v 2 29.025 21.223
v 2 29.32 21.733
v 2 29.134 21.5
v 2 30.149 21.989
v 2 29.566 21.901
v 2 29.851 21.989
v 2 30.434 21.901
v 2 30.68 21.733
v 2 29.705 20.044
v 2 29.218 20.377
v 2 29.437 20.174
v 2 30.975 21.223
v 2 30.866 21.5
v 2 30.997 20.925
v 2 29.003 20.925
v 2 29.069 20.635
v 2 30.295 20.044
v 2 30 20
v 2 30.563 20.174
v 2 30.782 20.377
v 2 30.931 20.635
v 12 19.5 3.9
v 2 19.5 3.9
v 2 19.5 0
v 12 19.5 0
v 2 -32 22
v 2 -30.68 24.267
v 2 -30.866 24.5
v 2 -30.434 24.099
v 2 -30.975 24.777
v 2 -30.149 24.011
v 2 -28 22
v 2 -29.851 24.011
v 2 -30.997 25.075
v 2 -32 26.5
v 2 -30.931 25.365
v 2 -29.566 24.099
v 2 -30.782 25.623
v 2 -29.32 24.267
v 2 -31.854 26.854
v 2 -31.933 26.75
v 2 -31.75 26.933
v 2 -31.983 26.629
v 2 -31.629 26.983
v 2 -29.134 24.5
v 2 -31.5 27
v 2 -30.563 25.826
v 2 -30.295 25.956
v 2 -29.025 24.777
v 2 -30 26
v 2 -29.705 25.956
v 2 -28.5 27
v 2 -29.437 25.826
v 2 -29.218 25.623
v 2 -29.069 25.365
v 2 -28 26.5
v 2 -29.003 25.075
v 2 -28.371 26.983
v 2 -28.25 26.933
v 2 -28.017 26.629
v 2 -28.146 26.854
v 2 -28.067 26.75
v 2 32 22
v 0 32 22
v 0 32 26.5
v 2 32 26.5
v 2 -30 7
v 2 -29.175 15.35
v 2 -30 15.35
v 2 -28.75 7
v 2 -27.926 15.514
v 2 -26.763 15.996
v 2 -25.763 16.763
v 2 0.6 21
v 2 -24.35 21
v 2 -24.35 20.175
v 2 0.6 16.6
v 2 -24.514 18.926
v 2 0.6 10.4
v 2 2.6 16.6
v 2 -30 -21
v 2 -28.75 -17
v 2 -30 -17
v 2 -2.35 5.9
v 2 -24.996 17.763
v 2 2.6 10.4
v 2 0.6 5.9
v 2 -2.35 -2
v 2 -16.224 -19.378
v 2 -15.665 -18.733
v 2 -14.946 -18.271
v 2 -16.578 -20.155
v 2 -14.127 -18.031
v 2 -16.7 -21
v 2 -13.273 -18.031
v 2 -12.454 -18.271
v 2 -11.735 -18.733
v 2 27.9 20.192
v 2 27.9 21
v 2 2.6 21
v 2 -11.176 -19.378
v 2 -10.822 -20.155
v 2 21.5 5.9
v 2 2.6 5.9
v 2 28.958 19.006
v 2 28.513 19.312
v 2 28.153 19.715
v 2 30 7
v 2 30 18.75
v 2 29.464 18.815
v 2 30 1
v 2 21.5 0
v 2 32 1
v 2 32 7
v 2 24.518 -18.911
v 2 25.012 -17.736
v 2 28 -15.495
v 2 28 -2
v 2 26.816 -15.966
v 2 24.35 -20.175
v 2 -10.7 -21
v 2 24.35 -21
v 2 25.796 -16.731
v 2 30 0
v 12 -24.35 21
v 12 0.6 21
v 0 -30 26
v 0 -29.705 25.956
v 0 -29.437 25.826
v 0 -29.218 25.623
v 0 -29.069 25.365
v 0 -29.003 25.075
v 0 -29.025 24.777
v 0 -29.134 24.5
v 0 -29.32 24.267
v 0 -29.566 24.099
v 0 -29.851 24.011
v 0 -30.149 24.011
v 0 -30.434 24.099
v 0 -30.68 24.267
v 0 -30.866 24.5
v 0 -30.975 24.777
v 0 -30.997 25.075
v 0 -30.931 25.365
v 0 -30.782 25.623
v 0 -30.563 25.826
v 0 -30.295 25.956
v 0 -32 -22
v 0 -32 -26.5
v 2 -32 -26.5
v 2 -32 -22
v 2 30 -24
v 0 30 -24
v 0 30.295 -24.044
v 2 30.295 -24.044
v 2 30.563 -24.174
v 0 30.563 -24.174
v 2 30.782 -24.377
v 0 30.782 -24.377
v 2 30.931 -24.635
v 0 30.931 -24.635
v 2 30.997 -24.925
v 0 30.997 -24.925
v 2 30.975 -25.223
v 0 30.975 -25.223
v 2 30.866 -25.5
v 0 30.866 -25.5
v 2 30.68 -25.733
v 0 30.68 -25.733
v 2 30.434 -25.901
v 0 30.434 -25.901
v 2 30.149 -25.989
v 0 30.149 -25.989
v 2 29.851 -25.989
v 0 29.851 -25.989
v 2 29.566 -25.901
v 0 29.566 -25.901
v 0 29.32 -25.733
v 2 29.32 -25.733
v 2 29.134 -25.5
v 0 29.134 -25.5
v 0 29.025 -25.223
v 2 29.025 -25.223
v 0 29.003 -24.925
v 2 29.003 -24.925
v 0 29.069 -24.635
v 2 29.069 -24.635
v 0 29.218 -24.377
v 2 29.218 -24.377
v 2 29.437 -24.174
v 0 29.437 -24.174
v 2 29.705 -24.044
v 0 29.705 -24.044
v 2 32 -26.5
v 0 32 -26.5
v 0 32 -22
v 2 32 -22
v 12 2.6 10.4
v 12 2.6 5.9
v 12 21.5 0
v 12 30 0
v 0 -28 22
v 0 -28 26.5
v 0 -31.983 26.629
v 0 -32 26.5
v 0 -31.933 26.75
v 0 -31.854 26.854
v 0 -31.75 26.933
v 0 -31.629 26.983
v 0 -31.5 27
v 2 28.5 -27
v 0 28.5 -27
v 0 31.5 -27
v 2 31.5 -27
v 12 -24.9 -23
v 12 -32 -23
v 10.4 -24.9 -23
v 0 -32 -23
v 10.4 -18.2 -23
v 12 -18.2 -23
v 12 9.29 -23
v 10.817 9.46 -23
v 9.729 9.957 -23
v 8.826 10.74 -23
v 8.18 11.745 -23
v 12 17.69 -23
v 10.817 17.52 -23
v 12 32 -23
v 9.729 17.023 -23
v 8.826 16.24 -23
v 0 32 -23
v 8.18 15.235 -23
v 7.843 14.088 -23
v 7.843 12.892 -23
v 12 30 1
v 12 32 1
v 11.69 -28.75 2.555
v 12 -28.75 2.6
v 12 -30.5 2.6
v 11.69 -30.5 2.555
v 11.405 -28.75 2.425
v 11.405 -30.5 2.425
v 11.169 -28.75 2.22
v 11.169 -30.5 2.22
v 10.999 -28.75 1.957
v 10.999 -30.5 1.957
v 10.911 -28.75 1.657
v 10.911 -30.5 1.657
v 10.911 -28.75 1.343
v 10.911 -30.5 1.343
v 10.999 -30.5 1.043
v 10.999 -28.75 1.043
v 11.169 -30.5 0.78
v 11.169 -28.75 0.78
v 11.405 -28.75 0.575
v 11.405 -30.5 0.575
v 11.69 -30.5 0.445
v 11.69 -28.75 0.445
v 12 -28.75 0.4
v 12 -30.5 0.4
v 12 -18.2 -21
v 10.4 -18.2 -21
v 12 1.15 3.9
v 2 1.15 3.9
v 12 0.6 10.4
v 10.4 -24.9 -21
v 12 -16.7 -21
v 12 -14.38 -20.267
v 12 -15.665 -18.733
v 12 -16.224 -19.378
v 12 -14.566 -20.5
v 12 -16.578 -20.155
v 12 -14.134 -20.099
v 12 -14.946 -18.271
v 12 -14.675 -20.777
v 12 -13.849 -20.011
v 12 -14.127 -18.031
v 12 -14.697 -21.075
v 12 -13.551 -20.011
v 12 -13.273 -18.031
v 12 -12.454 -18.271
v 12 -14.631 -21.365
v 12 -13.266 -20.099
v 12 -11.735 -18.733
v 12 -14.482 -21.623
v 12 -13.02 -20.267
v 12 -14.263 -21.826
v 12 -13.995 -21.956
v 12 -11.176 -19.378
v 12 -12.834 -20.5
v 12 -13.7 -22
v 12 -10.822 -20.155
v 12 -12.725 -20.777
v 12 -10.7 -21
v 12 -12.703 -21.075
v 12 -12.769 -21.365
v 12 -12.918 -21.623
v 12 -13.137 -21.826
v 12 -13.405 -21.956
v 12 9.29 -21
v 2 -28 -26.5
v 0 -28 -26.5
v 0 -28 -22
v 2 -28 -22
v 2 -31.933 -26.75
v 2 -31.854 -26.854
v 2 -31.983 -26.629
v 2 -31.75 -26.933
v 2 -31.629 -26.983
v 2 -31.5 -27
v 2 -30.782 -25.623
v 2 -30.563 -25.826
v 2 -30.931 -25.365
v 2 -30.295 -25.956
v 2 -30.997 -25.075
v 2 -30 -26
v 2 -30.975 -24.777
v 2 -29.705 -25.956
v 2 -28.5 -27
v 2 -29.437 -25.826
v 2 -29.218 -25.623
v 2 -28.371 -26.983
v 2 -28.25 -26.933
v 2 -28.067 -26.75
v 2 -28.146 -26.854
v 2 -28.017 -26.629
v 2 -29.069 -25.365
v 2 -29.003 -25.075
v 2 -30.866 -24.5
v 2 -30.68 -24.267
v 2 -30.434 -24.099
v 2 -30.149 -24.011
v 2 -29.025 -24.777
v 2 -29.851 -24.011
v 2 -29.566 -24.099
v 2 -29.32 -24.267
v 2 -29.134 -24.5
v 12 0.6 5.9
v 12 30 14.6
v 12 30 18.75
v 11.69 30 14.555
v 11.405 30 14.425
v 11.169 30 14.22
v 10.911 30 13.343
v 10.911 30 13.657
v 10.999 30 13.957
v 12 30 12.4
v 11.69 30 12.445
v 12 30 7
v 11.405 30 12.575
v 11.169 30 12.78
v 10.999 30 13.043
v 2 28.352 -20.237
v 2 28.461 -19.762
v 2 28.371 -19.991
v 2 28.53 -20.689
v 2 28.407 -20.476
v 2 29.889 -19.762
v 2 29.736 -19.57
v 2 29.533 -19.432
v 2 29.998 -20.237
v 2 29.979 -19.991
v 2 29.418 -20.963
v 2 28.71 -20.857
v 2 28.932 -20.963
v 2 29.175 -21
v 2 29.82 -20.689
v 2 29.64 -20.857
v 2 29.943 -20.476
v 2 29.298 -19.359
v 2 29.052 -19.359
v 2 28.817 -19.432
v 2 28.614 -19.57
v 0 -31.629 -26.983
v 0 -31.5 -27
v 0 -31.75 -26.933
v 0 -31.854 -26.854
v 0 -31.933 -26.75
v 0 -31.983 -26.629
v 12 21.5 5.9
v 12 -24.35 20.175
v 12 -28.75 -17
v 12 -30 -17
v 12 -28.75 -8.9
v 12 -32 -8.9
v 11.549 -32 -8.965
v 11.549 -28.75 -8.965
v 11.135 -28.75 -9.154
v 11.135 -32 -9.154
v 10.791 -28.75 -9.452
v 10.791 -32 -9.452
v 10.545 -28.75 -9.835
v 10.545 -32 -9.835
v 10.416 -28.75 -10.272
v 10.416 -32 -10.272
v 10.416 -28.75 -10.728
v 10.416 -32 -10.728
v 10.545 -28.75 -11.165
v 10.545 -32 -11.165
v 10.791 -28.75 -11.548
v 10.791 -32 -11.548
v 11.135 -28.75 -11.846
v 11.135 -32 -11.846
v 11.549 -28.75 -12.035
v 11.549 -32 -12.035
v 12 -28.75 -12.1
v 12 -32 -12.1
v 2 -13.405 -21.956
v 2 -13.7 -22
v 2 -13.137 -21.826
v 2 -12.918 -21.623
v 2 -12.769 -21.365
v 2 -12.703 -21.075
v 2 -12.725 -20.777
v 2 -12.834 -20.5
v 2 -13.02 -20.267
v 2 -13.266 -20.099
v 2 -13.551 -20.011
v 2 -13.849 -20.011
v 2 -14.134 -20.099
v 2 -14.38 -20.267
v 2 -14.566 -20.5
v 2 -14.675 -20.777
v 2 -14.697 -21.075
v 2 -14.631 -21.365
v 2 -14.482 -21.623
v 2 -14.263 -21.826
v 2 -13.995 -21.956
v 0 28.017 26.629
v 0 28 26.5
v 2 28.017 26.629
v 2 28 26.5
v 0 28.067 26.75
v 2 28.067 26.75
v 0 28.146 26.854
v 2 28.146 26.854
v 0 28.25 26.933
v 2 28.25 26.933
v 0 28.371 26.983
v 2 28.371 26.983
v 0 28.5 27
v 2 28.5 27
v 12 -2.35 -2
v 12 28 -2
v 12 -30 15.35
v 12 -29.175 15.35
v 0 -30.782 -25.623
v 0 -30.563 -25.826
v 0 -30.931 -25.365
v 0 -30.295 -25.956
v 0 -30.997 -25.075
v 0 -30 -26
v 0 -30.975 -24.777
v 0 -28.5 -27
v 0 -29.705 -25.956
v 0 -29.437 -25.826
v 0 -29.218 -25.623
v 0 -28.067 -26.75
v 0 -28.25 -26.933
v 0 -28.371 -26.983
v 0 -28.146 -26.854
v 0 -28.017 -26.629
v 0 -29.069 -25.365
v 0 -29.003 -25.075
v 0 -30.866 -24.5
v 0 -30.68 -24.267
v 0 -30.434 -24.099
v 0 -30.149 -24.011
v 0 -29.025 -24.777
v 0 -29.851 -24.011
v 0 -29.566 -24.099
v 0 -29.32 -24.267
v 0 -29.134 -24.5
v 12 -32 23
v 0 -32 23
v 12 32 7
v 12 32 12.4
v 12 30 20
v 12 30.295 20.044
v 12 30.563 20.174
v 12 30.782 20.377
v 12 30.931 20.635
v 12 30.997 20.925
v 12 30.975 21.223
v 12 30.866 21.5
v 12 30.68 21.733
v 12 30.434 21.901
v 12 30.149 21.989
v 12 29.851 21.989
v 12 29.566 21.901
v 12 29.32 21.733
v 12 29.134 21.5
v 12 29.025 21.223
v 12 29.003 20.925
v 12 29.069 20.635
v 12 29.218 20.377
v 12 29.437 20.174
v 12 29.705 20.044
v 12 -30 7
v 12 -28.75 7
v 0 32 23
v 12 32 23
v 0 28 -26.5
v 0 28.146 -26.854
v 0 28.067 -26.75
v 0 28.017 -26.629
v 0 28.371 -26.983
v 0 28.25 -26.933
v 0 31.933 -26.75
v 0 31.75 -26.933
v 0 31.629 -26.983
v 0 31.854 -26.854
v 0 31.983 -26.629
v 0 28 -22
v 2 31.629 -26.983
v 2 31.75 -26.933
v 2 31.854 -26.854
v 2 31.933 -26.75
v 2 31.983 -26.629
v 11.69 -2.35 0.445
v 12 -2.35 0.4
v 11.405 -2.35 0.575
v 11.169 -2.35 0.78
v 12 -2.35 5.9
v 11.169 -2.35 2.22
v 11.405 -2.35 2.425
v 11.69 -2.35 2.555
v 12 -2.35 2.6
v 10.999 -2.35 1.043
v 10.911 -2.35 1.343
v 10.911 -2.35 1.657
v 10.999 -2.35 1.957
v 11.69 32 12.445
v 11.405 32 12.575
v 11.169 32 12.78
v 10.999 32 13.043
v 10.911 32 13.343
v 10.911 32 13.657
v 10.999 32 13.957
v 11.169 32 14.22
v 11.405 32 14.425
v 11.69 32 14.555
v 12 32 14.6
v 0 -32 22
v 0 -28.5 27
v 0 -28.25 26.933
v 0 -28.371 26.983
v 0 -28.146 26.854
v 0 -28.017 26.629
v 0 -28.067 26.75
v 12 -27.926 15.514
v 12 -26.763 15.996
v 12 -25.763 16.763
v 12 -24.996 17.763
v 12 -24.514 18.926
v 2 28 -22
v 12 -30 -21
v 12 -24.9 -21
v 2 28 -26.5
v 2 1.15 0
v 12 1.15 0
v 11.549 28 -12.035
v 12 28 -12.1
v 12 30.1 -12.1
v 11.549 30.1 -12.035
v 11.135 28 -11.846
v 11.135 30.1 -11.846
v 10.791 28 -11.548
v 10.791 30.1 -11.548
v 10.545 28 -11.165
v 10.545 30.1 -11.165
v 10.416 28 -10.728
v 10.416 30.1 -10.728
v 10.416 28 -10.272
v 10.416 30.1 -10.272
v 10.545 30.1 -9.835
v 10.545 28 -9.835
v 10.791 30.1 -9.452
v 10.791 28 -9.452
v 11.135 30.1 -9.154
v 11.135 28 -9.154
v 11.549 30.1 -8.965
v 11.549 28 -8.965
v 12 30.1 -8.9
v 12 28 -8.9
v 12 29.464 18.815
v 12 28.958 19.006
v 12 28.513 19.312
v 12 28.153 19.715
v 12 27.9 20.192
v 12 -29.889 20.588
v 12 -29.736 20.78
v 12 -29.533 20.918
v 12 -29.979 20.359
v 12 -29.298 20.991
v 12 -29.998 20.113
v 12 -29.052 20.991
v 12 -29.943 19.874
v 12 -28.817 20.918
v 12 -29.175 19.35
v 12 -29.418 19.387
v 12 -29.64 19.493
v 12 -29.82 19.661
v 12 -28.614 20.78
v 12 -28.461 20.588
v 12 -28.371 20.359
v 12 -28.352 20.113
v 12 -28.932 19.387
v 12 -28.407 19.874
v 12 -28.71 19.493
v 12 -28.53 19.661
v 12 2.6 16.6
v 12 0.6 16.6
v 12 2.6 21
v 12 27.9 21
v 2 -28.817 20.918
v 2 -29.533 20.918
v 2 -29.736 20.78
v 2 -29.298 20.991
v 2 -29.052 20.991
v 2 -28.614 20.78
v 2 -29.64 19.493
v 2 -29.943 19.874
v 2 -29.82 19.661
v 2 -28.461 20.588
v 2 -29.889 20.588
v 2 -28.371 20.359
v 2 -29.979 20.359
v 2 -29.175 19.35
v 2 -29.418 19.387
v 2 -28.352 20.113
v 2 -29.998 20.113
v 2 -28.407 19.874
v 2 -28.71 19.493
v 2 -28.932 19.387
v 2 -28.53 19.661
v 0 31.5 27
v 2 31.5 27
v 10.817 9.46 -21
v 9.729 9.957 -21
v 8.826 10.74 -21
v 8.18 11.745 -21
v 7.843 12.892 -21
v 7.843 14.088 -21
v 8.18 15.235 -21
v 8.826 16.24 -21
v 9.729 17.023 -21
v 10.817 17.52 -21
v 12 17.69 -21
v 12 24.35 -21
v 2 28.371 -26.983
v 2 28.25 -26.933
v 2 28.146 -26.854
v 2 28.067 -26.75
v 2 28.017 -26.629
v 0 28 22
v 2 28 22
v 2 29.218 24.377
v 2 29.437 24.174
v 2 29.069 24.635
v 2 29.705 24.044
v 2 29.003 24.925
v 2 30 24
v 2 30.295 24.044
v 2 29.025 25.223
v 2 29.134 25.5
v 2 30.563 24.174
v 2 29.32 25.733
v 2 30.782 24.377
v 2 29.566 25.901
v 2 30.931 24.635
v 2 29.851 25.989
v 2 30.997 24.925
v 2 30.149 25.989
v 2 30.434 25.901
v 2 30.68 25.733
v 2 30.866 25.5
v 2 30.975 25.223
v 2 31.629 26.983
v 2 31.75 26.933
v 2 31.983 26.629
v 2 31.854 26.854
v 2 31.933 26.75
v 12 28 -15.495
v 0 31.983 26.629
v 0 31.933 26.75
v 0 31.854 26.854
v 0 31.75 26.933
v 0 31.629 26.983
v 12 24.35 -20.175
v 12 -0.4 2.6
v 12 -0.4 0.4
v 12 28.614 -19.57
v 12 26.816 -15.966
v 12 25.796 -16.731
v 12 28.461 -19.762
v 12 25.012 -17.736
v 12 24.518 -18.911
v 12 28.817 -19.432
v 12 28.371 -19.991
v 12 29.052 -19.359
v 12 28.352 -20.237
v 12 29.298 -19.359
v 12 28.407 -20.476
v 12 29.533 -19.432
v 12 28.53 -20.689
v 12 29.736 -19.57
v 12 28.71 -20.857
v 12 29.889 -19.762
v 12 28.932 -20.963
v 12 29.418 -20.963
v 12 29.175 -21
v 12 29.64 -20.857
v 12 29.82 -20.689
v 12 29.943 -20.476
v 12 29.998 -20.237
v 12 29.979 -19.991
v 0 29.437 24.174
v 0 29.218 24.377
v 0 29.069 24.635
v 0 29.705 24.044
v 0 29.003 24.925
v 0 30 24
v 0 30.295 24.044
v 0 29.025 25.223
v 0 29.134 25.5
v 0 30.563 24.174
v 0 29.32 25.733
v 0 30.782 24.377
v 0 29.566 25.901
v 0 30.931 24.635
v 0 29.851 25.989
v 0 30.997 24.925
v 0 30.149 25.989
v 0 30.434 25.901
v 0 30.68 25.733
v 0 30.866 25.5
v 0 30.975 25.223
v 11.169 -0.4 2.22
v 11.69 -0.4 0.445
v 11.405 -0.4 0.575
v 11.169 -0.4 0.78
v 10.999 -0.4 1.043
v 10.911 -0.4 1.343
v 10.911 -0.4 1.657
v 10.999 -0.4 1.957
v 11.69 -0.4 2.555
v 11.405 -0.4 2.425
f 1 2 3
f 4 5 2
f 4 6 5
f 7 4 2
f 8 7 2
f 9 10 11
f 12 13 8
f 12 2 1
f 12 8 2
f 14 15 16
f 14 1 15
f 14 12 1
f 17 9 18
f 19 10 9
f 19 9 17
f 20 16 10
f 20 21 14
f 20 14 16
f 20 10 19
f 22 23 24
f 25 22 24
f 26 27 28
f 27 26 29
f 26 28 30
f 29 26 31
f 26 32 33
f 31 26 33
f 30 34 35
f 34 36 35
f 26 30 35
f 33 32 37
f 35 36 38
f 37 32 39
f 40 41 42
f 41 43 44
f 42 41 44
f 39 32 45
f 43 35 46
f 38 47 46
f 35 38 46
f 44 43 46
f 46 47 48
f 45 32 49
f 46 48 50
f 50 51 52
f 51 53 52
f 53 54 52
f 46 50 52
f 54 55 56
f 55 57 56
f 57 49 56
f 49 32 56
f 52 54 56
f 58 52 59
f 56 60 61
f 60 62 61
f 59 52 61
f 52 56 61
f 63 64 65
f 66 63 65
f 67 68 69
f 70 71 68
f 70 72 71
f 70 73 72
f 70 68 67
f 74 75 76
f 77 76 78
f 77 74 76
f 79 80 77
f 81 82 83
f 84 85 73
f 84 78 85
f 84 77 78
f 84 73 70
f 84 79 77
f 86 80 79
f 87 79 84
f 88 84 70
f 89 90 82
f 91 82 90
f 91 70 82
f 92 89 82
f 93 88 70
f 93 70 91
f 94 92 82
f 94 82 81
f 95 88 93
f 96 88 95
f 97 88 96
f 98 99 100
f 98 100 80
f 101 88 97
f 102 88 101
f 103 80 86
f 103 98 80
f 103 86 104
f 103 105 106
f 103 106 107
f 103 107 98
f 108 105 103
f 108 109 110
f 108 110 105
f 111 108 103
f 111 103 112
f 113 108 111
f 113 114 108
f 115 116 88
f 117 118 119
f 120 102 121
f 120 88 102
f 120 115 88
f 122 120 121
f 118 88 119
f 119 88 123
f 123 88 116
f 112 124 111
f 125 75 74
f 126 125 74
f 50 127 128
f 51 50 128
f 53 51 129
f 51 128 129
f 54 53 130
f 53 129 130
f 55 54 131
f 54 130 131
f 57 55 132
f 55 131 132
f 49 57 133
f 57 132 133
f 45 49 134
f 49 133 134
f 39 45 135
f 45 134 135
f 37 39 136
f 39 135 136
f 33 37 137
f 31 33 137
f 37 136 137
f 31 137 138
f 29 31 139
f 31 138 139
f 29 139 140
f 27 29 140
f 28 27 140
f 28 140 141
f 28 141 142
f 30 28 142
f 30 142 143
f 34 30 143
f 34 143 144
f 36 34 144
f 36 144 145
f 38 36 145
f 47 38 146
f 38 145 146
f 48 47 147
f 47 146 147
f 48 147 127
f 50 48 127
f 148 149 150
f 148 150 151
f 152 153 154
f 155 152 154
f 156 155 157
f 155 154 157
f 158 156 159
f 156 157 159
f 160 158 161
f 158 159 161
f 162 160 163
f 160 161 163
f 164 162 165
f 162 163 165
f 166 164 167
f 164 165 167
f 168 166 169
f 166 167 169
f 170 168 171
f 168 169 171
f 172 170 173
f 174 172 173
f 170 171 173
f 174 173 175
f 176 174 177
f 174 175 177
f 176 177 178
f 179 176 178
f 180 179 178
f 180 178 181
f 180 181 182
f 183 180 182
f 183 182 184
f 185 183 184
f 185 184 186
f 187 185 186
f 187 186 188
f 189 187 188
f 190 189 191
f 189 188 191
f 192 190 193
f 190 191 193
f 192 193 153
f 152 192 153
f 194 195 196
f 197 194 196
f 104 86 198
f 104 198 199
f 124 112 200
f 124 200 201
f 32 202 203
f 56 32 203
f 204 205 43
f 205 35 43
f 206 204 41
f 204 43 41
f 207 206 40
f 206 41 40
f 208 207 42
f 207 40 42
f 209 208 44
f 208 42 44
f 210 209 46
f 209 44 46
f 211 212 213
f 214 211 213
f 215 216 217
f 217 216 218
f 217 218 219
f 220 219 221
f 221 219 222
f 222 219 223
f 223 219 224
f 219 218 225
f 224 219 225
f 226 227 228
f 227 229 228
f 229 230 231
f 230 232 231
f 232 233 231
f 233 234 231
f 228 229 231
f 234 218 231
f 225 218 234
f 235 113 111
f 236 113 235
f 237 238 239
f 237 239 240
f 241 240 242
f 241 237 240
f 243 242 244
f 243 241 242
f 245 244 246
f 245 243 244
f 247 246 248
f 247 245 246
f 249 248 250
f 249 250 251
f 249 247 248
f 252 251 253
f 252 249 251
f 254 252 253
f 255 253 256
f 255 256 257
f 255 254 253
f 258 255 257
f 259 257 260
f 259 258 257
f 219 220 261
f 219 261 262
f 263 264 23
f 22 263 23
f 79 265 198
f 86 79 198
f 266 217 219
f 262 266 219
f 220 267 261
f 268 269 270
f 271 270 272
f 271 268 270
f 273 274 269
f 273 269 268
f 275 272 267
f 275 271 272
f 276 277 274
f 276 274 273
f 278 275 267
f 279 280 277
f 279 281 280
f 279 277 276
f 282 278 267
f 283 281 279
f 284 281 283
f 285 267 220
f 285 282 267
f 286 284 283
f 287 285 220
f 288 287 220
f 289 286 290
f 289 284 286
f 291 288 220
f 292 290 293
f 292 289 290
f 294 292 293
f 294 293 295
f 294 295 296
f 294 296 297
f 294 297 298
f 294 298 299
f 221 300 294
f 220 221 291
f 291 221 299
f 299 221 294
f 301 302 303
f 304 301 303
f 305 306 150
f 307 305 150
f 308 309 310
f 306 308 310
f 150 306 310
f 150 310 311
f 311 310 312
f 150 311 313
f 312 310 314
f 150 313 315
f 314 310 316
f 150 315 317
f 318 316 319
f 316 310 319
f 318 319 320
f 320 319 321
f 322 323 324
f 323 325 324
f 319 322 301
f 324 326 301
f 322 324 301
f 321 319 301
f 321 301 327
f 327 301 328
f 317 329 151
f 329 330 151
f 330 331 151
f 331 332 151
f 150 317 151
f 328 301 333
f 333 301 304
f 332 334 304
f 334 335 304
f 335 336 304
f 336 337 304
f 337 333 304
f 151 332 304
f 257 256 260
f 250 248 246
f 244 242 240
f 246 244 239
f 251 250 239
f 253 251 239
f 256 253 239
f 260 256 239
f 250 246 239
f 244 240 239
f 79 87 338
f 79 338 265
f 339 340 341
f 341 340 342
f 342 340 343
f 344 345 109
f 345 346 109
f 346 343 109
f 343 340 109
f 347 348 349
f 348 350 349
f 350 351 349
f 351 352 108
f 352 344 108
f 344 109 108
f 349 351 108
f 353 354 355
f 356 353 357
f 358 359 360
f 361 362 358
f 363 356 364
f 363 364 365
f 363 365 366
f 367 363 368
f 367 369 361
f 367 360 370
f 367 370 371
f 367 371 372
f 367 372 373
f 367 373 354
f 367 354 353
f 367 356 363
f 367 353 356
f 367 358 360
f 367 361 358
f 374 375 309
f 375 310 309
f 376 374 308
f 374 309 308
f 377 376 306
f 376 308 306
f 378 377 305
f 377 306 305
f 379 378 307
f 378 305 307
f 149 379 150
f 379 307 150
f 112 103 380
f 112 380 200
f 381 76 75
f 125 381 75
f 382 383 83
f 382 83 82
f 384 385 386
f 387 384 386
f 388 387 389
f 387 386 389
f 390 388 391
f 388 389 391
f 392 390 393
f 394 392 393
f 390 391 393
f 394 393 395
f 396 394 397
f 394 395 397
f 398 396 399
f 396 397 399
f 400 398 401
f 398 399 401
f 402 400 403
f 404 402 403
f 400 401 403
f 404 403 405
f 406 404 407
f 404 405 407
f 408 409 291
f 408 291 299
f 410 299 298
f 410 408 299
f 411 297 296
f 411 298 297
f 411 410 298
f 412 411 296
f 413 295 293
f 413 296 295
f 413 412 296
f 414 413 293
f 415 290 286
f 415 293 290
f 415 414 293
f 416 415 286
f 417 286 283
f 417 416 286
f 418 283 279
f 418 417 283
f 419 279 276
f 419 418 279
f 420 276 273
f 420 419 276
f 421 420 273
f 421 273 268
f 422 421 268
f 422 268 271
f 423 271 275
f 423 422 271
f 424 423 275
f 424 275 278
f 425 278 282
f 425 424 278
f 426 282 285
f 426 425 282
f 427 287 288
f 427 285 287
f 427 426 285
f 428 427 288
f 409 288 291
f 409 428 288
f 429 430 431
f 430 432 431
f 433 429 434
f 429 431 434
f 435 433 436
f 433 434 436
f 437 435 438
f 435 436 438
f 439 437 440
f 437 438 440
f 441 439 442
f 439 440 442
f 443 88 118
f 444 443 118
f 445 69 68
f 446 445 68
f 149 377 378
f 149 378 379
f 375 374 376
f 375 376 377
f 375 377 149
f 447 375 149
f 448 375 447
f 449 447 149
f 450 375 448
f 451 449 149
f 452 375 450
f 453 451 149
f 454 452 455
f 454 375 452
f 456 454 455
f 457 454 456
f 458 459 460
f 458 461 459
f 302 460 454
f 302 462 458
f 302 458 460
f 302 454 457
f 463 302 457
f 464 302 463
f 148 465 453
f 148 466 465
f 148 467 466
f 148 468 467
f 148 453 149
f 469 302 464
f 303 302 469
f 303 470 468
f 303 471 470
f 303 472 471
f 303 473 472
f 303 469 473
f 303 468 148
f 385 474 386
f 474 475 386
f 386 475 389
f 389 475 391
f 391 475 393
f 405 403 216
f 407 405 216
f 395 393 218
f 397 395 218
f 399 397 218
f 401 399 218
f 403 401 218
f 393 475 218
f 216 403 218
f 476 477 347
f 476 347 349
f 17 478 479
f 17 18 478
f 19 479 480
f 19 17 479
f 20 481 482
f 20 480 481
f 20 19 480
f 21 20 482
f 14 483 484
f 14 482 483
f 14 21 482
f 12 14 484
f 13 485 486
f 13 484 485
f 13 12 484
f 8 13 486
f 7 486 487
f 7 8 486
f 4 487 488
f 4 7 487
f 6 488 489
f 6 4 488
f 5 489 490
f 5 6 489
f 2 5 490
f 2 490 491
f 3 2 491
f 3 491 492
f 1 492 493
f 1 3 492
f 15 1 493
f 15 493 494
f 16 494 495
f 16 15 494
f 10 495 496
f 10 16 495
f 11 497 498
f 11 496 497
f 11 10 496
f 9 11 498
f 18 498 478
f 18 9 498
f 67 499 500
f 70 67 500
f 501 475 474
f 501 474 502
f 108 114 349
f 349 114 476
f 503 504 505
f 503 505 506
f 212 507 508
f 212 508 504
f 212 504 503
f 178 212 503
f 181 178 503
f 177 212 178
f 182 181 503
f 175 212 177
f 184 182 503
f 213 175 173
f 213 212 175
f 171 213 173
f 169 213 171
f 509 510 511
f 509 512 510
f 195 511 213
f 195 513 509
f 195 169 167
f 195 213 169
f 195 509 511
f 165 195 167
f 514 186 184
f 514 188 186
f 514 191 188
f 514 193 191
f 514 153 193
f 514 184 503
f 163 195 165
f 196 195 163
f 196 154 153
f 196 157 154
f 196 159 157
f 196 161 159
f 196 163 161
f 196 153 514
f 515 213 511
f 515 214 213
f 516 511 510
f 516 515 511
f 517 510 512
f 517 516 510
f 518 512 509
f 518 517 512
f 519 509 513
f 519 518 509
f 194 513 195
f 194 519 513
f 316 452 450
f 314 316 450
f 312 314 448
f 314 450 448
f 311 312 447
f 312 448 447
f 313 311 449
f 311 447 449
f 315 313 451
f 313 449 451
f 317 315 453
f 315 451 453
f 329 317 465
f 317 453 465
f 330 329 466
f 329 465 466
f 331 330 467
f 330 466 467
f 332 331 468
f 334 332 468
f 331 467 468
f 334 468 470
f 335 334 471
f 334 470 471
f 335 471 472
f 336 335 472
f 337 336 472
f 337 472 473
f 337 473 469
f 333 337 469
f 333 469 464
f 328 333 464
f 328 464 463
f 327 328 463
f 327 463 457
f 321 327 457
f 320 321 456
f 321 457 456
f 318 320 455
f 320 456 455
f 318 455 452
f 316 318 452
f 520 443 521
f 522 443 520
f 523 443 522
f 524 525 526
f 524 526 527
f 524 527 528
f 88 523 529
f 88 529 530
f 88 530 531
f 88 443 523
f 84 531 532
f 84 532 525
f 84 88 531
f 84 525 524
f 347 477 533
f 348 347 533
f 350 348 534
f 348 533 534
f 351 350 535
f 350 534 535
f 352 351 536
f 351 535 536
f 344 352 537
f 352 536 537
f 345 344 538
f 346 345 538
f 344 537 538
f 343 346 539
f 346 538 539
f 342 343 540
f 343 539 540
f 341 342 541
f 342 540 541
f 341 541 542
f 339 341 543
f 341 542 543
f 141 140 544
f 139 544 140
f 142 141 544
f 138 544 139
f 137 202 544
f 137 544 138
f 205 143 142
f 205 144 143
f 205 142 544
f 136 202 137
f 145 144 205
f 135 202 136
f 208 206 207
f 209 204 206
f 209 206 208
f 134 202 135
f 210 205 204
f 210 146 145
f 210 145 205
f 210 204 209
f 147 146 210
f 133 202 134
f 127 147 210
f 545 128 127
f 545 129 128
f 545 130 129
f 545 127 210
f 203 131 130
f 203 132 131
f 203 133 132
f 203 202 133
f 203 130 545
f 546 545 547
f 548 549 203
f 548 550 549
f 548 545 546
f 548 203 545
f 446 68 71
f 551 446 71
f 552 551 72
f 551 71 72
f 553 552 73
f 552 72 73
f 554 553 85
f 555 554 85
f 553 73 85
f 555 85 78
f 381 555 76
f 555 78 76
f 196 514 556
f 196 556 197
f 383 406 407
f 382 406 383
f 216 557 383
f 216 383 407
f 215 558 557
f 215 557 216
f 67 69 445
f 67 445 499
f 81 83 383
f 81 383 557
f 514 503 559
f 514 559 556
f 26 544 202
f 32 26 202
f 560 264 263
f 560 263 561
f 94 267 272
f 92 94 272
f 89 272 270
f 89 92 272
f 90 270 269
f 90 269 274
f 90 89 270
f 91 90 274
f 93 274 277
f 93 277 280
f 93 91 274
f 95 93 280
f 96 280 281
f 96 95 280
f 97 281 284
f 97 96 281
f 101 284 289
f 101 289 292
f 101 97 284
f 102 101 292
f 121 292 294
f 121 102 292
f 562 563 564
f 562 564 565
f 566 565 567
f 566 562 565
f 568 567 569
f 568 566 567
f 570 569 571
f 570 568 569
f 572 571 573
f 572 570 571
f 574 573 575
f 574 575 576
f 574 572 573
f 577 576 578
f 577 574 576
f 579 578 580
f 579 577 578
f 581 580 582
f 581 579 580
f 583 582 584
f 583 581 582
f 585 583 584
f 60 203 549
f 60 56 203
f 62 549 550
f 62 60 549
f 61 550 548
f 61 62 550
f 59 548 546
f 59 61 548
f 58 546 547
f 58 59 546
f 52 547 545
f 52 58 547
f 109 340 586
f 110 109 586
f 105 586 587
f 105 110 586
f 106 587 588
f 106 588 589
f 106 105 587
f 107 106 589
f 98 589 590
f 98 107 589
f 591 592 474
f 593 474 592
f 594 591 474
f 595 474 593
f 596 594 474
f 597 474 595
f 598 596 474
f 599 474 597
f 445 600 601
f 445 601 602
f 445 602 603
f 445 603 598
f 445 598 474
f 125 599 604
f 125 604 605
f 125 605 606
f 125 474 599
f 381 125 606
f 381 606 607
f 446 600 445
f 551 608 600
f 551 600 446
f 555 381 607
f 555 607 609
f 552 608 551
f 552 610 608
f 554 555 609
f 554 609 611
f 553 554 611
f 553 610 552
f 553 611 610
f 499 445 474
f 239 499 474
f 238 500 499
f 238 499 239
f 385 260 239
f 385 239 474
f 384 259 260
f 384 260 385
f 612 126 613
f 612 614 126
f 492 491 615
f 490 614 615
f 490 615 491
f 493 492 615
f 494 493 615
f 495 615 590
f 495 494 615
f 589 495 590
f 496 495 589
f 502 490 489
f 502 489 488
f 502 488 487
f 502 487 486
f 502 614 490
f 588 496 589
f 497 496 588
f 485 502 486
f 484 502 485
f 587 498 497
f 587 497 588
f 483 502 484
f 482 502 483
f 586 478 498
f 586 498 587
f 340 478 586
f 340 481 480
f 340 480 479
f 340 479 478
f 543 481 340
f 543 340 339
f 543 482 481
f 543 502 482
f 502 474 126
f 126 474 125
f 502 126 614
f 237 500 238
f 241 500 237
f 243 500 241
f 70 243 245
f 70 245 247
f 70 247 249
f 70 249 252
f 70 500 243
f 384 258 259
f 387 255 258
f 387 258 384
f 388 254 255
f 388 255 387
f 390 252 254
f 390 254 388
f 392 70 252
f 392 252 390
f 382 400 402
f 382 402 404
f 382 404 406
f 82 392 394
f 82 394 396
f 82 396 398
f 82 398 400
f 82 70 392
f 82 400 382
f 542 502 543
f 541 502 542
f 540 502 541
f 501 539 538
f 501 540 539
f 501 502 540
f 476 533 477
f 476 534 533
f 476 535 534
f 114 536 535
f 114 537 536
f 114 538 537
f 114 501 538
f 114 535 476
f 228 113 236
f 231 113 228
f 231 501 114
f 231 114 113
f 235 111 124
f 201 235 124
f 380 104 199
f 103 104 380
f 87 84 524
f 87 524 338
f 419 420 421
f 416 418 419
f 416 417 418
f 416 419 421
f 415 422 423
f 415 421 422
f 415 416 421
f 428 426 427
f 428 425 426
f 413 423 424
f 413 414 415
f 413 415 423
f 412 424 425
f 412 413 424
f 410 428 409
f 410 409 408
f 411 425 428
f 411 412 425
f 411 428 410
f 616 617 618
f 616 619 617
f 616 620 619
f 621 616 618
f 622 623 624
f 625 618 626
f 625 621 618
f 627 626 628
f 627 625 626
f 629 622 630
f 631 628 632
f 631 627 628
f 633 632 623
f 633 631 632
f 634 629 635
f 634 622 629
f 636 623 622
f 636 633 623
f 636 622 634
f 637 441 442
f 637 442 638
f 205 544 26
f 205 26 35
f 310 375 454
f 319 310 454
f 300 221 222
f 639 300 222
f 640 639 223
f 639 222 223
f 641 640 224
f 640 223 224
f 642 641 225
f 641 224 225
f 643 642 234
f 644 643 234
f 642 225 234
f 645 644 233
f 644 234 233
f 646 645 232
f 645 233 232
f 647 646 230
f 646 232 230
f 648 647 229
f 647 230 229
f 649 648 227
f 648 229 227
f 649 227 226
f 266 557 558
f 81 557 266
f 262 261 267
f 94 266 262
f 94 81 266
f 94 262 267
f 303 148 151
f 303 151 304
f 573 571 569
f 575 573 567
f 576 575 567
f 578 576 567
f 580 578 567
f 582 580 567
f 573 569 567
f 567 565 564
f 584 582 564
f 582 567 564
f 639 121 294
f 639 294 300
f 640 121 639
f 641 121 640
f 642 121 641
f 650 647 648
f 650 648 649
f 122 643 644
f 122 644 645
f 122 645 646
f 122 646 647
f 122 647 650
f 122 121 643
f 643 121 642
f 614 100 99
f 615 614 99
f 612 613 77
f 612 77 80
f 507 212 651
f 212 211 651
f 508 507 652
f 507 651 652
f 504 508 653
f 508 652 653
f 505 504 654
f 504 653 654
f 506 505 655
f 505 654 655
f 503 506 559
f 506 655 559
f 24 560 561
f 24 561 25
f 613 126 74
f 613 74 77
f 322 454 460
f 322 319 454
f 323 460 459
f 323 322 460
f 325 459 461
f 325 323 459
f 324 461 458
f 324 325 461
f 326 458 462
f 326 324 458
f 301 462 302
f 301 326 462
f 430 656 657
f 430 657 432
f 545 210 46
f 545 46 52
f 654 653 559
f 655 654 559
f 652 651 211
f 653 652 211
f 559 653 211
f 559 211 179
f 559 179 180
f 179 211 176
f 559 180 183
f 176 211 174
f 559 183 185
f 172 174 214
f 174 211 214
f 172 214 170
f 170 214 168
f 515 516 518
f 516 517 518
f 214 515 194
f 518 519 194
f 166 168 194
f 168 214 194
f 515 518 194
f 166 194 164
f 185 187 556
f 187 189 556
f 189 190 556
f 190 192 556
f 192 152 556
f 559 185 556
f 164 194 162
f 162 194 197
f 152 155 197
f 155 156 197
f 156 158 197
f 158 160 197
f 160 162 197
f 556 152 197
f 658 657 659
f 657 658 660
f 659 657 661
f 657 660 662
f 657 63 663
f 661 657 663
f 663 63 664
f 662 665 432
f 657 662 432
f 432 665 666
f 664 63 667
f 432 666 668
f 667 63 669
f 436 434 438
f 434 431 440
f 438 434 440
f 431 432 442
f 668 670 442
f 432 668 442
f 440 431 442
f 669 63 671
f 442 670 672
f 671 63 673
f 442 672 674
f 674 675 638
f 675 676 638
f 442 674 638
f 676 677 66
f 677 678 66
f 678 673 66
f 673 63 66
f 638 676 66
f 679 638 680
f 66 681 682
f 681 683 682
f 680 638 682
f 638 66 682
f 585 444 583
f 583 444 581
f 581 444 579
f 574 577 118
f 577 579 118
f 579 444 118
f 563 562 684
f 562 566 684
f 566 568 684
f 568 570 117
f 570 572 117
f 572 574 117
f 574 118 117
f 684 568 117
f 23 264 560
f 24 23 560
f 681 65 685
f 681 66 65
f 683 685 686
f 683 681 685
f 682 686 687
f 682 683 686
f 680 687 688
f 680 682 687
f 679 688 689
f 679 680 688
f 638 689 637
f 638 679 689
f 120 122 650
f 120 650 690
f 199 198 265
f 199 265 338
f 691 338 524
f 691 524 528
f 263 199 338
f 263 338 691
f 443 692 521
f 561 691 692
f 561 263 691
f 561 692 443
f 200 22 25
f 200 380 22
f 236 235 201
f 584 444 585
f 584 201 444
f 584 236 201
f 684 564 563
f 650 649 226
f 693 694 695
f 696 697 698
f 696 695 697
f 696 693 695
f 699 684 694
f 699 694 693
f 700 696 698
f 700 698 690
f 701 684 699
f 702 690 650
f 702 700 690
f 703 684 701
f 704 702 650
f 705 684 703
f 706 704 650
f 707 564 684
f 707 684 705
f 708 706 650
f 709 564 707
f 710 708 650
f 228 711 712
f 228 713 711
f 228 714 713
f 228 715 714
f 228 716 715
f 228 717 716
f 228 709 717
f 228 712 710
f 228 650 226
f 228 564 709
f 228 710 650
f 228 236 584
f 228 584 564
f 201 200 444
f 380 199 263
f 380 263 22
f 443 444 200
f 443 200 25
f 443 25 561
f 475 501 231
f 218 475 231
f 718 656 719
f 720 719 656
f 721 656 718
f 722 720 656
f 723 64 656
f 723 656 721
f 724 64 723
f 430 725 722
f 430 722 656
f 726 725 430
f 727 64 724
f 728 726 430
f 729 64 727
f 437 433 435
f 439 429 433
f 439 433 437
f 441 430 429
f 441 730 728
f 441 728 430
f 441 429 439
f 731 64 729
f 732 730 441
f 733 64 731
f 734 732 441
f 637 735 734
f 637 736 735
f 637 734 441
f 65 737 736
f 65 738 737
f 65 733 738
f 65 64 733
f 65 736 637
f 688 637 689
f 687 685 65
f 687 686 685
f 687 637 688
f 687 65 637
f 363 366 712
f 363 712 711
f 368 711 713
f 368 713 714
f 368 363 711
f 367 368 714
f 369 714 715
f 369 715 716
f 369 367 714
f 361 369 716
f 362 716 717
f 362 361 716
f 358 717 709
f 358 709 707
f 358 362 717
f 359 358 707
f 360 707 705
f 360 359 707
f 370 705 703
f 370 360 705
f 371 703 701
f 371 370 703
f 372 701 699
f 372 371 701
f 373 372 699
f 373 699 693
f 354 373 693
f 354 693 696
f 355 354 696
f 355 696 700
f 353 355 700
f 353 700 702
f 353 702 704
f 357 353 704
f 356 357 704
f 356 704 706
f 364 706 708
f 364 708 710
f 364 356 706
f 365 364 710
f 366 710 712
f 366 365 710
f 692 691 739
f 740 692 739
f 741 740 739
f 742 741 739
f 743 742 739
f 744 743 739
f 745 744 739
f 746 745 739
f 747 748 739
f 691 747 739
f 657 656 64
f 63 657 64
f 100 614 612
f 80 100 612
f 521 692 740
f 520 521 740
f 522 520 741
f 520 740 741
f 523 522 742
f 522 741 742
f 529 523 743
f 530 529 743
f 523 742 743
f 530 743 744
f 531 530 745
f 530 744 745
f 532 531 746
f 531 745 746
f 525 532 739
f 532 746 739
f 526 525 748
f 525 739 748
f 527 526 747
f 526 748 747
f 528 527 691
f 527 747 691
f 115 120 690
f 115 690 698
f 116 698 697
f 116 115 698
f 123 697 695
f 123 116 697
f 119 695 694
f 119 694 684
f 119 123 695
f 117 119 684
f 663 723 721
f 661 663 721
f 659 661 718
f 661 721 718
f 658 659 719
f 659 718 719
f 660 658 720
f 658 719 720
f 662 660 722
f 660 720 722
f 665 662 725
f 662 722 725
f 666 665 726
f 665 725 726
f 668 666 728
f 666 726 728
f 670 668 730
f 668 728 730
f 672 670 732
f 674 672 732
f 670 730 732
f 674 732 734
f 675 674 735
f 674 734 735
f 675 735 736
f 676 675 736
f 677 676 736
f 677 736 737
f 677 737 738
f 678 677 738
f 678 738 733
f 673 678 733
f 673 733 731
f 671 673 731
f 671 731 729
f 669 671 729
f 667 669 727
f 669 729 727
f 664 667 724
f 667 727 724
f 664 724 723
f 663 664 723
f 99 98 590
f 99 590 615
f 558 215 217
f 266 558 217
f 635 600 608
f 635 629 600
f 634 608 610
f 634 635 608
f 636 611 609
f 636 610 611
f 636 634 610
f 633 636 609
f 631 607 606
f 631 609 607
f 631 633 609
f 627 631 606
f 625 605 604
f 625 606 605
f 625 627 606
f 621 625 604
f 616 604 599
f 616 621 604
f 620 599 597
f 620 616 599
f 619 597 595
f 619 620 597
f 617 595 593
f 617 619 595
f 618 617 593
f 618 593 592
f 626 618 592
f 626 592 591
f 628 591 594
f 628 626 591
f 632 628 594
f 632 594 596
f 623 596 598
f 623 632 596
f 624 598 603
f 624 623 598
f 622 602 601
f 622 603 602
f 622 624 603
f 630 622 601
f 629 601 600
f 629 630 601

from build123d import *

# Parameters (mm, degrees)
SKETCH_1_W            = 46
SKETCH_1_H            = 64
EXTRUDE_1_DEPTH       = 12
SHELL_1_T             = -2
SKETCH_3_W            = 3.9
SKETCH_3_H            = 18.35
SKETCH_3_W_2          = 4.4
SKETCH_3_H_2          = 2
EXTRUDE_6_DEPTH       = 10
SKETCH_9_W            = 24
SKETCH_9_H            = 1.25
EXTRUDE_9_DEPTH       = 10
SKETCH_16_W           = 19
SKETCH_16_H           = 2
EXTRUDE_9_2_DEPTH     = 10
CUT_EXTRUDE_START     = -4
SKETCH_17_R           = 1.6
CUT_EXTRUDE_3_3_DEPTH = 2.1
CUT_EXTRUDE_1_REACH   = 71.058
SKETCH_4_R            = 1.1
SKETCH_4_W            = 10
SKETCH_4_H            = 6
CUT_EXTRUDE_3_2_REACH = 71.058
CUT_EXTRUDE_START_2   = -3.25
SKETCH_11_R           = 1.1
CUT_EXTRUDE_2_DEPTH   = 1.75
SKETCH_6_R            = 0.825
SKETCH_6_R_2          = 1
EXTRUDE_7_DEPTH       = 10
CUT_EXTRUDE_START_3   = -10
SKETCH_7_R            = 1
SKETCH_7_R_2          = 0.825
CUT_EXTRUDE_3_DEPTH   = 10
F_2MM_3_START         = -1.95
F_2MM_3_DEPTH         = 1.95
CUT_EXTRUDE_4_REACH   = 59.306
SKETCH_14_W           = 3.2
SKETCH_14_H           = 6.7
CUT_EXTRUDE_3_4_REACH = 59.306
SKETCH_19_R           = 4.2
SKETCH_20_W           = 5
SKETCH_20_H           = 4
SKETCH_20_R           = 1
EXTRUDE_10_DEPTH      = 2
EXTRUDE_10_2_DEPTH    = 2
EXTRUDE_10_3_DEPTH    = 2
EXTRUDE_10_4_DEPTH    = 2
FILLET_1_R            = 0.5
FILLET_2_R            = 0.5
FILLET_3_R            = 0.5
FILLET_4_R            = 0.5


with BuildPart() as part:
    # 草图1 → 凸台-拉伸1 (new body)
    with BuildSketch(Plane(origin=(0, 0, 0), x_dir=(0, 0, -1), z_dir=(1, 0, 0))):
        Rectangle(SKETCH_1_W, SKETCH_1_H)
    extrude(amount=EXTRUDE_1_DEPTH)

    # 抽壳1
    shell_1_openings = [part.faces().sort_by_distance(p)[0] for p in [
        (12, 0, 0),
    ]]
    offset(amount=SHELL_1_T, openings=shell_1_openings, kind=Kind.INTERSECTION)

    # 草图3 → 机位凸台-拉伸6 (add)
    # profile 1 of 2: a face of its own
    with BuildSketch(Plane(origin=(2, 0, 0), x_dir=(0, 0, -1), z_dir=(1, 0, 0))):
        Polygon((-5.9, 21.5), (0, 21.5), (0, 30), (2, 30), (2, 17.175), (2, -2.35), (-5.9, -2.35), (-5.9, 0.6), (-10.4, 0.6), (-10.4, 2.6), (-5.9, 2.6), align=None)
        with Locations((-1.95, 10.325)):
            Rectangle(SKETCH_3_W, SKETCH_3_H, mode=Mode.SUBTRACT)
    # profile 2 of 2: a face of its own
    with BuildSketch(Plane(origin=(2, 0, 0), x_dir=(0, 0, -1), z_dir=(1, 0, 0))):
        with Locations((-18.8, 1.6)):
            Rectangle(SKETCH_3_W_2, SKETCH_3_H_2)
    extrude(amount=EXTRUDE_6_DEPTH)

    # 草图9 → Extrude 9 (add)
    with BuildSketch(Plane(origin=(2, 0, 0), x_dir=(0, 0, -1), z_dir=(1, 0, 0))):
        with Locations((5, -29.375)):
            Rectangle(SKETCH_9_W, SKETCH_9_H)
    extrude(amount=EXTRUDE_9_DEPTH)

    # 草图16 → Extrude 9 2 (add)
    with BuildSketch(Plane(origin=(2, 0, 0), x_dir=(0, 0, -1), z_dir=(1, 0, 0))):
        with Locations((11.5, 29)):
            Rectangle(SKETCH_16_W, SKETCH_16_H)
    extrude(amount=EXTRUDE_9_2_DEPTH)

    # 草图17 → 后部孔位3切除-拉伸3 (cut)
    with BuildSketch(Plane(origin=(0, 32, 0), x_dir=(1, 0, 0), z_dir=(0, 1, 0)).offset(CUT_EXTRUDE_START)):
        with Locations((12, 10.5)):
            Circle(SKETCH_17_R)
    extrude(amount=CUT_EXTRUDE_3_3_DEPTH, mode=Mode.SUBTRACT)

    # 草图4 → 后部孔位切除-拉伸1 (cut, up to next)
    with BuildSketch(Plane(origin=(0, 32, 0), x_dir=(1, 0, 0), z_dir=(0, 1, 0)), mode=Mode.PRIVATE) as cut_extrude_1_sk1:
        with Locations((12, -13.5)):
            Circle(SKETCH_4_R)
    cut_extrude_1_tool1 = extrude(cut_extrude_1_sk1.sketch, amount=-CUT_EXTRUDE_1_REACH, mode=Mode.PRIVATE) & part.part
    # 草图4 → 后部孔位切除-拉伸1 (cut, up to next)
    with BuildSketch(Plane(origin=(0, 32, 0), x_dir=(1, 0, 0), z_dir=(0, 1, 0)), mode=Mode.PRIVATE) as cut_extrude_1_sk2:
        with Locations((7, -4)):
            Rectangle(SKETCH_4_W, SKETCH_4_H)
    cut_extrude_1_tool2 = extrude(cut_extrude_1_sk2.sketch, amount=-CUT_EXTRUDE_1_REACH, mode=Mode.PRIVATE) & part.part
    add(cut_extrude_1_tool1.solids().sort_by_distance((12, 32, 13.5))[0], mode=Mode.SUBTRACT)
    add(cut_extrude_1_tool2.solids().sort_by_distance((7, 32, 4))[0], mode=Mode.SUBTRACT)

    # 草图5 → 前部切除3-拉伸2 (cut, up to next)
    with BuildSketch(Plane.XZ.offset(32), mode=Mode.PRIVATE) as cut_extrude_3_2_sk1:
        with BuildLine():
            Line((12, -12.1), (12, -8.9))
            ThreePointArc((12, -8.9), (10.4, -10.5), (12, -12.1))
        make_face()
    cut_extrude_3_2_tool1 = extrude(cut_extrude_3_2_sk1.sketch, amount=-CUT_EXTRUDE_3_2_REACH, mode=Mode.PRIVATE) & part.part
    add(cut_extrude_3_2_tool1.solids().sort_by_distance((11.320939, -32, -10.5))[0], mode=Mode.SUBTRACT)

    # 草图11 → 切除-拉伸2 (cut)
    with BuildSketch(Plane.XZ.offset(32).offset(CUT_EXTRUDE_START_2)):
        with Locations((12, 1.5)):
            Circle(SKETCH_11_R)
    extrude(amount=CUT_EXTRUDE_2_DEPTH, mode=Mode.SUBTRACT)

    # 草图6 → 螺丝孔凸台-拉伸7 (add)
    # profile 1 of 4: a face of its own
    with BuildSketch(Plane(origin=(2, 0, 0), x_dir=(0, 0, -1), z_dir=(1, 0, 0))):
        with BuildLine():
            Line((-20.175, -24.35), (-23, -24.35))
            Line((-23, -24.35), (-23, -32))
            Line((-23, -32), (-15.35, -32))
            Line((-15.35, -32), (-15.35, -29.175))
            ThreePointArc((-15.35, -29.175), (-16.763209781, -25.763209781), (-20.175, -24.35))
        make_face()
        with Locations((-20.175, -29.175)):
            Circle(SKETCH_6_R, mode=Mode.SUBTRACT)
    # profile 2 of 4: a face of its own
    with BuildSketch(Plane(origin=(2, 0, 0), x_dir=(0, 0, -1), z_dir=(1, 0, 0))):
        with BuildLine():
            Line((-23, 28.969223594), (-23, 31.030776406))
            ThreePointArc((-23, 31.030776406), (-22.590990258, 31.590990258), (-22.030776406, 32))
            Line((-22.030776406, 32), (-19.969223594, 32))
            ThreePointArc((-19.969223594, 32), (-18.75332077, 29.877801645), (-20.192225279, 27.9))
            Line((-20.192225279, 27.9), (-23, 27.9))
            Line((-23, 27.9), (-23, 28.969223594))
        make_face()
        with Locations((-21, 30)):
            Circle(SKETCH_6_R_2, mode=Mode.SUBTRACT)
    # profile 3 of 4: a face of its own
    with BuildSketch(Plane(origin=(2, 0, 0), x_dir=(0, 0, -1), z_dir=(1, 0, 0))):
        with BuildLine():
            Line((15.35, 32), (23, 32))
            Line((23, 32), (23, 24.35))
            Line((23, 24.35), (20.175, 24.35))
            ThreePointArc((20.175, 24.35), (16.763209781, 25.763209781), (15.35, 29.175))
            Line((15.35, 29.175), (15.35, 32))
        make_face()
        with Locations((20.175, 29.175)):
            Circle(SKETCH_6_R, mode=Mode.SUBTRACT)
    # profile 4 of 4: a face of its own
    with BuildSketch(Plane(origin=(2, 0, 0), x_dir=(0, 0, -1), z_dir=(1, 0, 0))):
        with BuildLine():
            Line((23, -11.463932023), (23, -15.936067977))
            ThreePointArc((23, -15.936067977), (18, -13.7), (23, -11.463932023))
        make_face()
        with Locations((21, -13.7)):
            Circle(SKETCH_6_R_2, mode=Mode.SUBTRACT)
    extrude(amount=EXTRUDE_7_DEPTH)

    # 草图7 → Cut-Extrude 3 (cut)
    with BuildSketch(Plane(origin=(12, 0, 0), x_dir=(0, 0, -1), z_dir=(1, 0, 0)).offset(CUT_EXTRUDE_START_3)):
        with Locations((21, -13.7)):
            Circle(SKETCH_7_R)
        with Locations((-21, 30)):
            Circle(SKETCH_7_R)
        with Locations((20.175, 29.175)):
            Circle(SKETCH_7_R_2)
    extrude(amount=CUT_EXTRUDE_3_DEPTH, mode=Mode.SUBTRACT)

    # 草图12 → 2mm切孔切除-拉伸3 (cut)
    with BuildSketch(Plane.XZ.offset(2.35).offset(F_2MM_3_START)):
        with BuildLine():
            Line((12, 2.6), (12, 0.4))
            ThreePointArc((12, 0.4), (10.9, 1.5), (12, 2.6))
        make_face()
    extrude(amount=F_2MM_3_DEPTH, mode=Mode.SUBTRACT)

    # 草图14 → 拨杆切除-拉伸4 (cut, up to next)
    with BuildSketch(Plane(origin=(0, 0, -23), x_dir=(-1, 0, 0), z_dir=(0, 0, -1)), mode=Mode.PRIVATE) as cut_extrude_4_sk1:
        with Locations((-12, -21.55)):
            Rectangle(SKETCH_14_W, SKETCH_14_H)
    cut_extrude_4_tool1 = extrude(cut_extrude_4_sk1.sketch, amount=-CUT_EXTRUDE_4_REACH, mode=Mode.PRIVATE) & part.part
    add(cut_extrude_4_tool1.solids().sort_by_distance((12, -21.55, -23))[0], mode=Mode.SUBTRACT)

    # 草图19 → Cut-Extrude 3 4 (cut, up to next)
    with BuildSketch(Plane(origin=(0, 0, -23), x_dir=(-1, 0, 0), z_dir=(0, 0, -1)), mode=Mode.PRIVATE) as cut_extrude_3_4_sk1:
        with Locations((-12, 13.49)):
            Circle(SKETCH_19_R)
    cut_extrude_3_4_tool1 = extrude(cut_extrude_3_4_sk1.sketch, amount=-CUT_EXTRUDE_3_4_REACH, mode=Mode.PRIVATE) & part.part
    add(cut_extrude_3_4_tool1.solids().sort_by_distance((12, 13.49, -23))[0], mode=Mode.SUBTRACT)


with BuildPart() as body_2:
    # 草图20 → 固定位凸台-拉伸10 (new body)
    with BuildSketch(Plane.ZY):
        with Locations((-24.5, 30)):
            Rectangle(SKETCH_20_W, SKETCH_20_H)
        with Locations((-25, 30)):
            Circle(SKETCH_20_R, mode=Mode.SUBTRACT)
    extrude(amount=-EXTRUDE_10_DEPTH)

    # 圆角4
    fillet_4_edges = [body_2.edges().sort_by_distance(p)[0] for p in [
        (1, 28, -27),
        (1, 32, -27),
    ]]
    fillet(fillet_4_edges, radius=FILLET_4_R)


with BuildPart() as body_3:
    # 草图20 → Extrude 10 2 (new body)
    with BuildSketch(Plane.ZY):
        with Locations((24.5, 30)):
            Rectangle(SKETCH_20_W, SKETCH_20_H)
        with Locations(Location((25, 30, 0), (0, 0, 180))):
            Circle(SKETCH_20_R, mode=Mode.SUBTRACT)
    extrude(amount=-EXTRUDE_10_2_DEPTH)

    # 圆角3
    fillet_3_edges = [body_3.edges().sort_by_distance(p)[0] for p in [
        (1, 32, 27),
        (1, 28, 27),
    ]]
    fillet(fillet_3_edges, radius=FILLET_3_R)


with BuildPart() as body_4:
    # 草图20 → Extrude 10 3 (new body)
    with BuildSketch(Plane.ZY):
        with Locations((24.5, -30)):
            Rectangle(SKETCH_20_W, SKETCH_20_H)
        with Locations((25, -30)):
            Circle(SKETCH_20_R, mode=Mode.SUBTRACT)
    extrude(amount=-EXTRUDE_10_3_DEPTH)

    # 圆角2
    fillet_2_edges = [body_4.edges().sort_by_distance(p)[0] for p in [
        (1, -28, 27),
        (1, -32, 27),
    ]]
    fillet(fillet_2_edges, radius=FILLET_2_R)


with BuildPart() as body_5:
    # 草图20 → Extrude 10 4 (new body)
    with BuildSketch(Plane.ZY):
        with Locations((-24.5, -30)):
            Rectangle(SKETCH_20_W, SKETCH_20_H)
        with Locations(Location((-25, -30, 0), (0, 0, 180))):
            Circle(SKETCH_20_R, mode=Mode.SUBTRACT)
    extrude(amount=-EXTRUDE_10_4_DEPTH)

    # 圆角1
    fillet_1_edges = [body_5.edges().sort_by_distance(p)[0] for p in [
        (1, -32, -27),
        (1, -28, -27),
    ]]
    fillet(fillet_1_edges, radius=FILLET_1_R)


solid = Compound([part.part, body_2.part, body_3.part, body_4.part, body_5.part])
